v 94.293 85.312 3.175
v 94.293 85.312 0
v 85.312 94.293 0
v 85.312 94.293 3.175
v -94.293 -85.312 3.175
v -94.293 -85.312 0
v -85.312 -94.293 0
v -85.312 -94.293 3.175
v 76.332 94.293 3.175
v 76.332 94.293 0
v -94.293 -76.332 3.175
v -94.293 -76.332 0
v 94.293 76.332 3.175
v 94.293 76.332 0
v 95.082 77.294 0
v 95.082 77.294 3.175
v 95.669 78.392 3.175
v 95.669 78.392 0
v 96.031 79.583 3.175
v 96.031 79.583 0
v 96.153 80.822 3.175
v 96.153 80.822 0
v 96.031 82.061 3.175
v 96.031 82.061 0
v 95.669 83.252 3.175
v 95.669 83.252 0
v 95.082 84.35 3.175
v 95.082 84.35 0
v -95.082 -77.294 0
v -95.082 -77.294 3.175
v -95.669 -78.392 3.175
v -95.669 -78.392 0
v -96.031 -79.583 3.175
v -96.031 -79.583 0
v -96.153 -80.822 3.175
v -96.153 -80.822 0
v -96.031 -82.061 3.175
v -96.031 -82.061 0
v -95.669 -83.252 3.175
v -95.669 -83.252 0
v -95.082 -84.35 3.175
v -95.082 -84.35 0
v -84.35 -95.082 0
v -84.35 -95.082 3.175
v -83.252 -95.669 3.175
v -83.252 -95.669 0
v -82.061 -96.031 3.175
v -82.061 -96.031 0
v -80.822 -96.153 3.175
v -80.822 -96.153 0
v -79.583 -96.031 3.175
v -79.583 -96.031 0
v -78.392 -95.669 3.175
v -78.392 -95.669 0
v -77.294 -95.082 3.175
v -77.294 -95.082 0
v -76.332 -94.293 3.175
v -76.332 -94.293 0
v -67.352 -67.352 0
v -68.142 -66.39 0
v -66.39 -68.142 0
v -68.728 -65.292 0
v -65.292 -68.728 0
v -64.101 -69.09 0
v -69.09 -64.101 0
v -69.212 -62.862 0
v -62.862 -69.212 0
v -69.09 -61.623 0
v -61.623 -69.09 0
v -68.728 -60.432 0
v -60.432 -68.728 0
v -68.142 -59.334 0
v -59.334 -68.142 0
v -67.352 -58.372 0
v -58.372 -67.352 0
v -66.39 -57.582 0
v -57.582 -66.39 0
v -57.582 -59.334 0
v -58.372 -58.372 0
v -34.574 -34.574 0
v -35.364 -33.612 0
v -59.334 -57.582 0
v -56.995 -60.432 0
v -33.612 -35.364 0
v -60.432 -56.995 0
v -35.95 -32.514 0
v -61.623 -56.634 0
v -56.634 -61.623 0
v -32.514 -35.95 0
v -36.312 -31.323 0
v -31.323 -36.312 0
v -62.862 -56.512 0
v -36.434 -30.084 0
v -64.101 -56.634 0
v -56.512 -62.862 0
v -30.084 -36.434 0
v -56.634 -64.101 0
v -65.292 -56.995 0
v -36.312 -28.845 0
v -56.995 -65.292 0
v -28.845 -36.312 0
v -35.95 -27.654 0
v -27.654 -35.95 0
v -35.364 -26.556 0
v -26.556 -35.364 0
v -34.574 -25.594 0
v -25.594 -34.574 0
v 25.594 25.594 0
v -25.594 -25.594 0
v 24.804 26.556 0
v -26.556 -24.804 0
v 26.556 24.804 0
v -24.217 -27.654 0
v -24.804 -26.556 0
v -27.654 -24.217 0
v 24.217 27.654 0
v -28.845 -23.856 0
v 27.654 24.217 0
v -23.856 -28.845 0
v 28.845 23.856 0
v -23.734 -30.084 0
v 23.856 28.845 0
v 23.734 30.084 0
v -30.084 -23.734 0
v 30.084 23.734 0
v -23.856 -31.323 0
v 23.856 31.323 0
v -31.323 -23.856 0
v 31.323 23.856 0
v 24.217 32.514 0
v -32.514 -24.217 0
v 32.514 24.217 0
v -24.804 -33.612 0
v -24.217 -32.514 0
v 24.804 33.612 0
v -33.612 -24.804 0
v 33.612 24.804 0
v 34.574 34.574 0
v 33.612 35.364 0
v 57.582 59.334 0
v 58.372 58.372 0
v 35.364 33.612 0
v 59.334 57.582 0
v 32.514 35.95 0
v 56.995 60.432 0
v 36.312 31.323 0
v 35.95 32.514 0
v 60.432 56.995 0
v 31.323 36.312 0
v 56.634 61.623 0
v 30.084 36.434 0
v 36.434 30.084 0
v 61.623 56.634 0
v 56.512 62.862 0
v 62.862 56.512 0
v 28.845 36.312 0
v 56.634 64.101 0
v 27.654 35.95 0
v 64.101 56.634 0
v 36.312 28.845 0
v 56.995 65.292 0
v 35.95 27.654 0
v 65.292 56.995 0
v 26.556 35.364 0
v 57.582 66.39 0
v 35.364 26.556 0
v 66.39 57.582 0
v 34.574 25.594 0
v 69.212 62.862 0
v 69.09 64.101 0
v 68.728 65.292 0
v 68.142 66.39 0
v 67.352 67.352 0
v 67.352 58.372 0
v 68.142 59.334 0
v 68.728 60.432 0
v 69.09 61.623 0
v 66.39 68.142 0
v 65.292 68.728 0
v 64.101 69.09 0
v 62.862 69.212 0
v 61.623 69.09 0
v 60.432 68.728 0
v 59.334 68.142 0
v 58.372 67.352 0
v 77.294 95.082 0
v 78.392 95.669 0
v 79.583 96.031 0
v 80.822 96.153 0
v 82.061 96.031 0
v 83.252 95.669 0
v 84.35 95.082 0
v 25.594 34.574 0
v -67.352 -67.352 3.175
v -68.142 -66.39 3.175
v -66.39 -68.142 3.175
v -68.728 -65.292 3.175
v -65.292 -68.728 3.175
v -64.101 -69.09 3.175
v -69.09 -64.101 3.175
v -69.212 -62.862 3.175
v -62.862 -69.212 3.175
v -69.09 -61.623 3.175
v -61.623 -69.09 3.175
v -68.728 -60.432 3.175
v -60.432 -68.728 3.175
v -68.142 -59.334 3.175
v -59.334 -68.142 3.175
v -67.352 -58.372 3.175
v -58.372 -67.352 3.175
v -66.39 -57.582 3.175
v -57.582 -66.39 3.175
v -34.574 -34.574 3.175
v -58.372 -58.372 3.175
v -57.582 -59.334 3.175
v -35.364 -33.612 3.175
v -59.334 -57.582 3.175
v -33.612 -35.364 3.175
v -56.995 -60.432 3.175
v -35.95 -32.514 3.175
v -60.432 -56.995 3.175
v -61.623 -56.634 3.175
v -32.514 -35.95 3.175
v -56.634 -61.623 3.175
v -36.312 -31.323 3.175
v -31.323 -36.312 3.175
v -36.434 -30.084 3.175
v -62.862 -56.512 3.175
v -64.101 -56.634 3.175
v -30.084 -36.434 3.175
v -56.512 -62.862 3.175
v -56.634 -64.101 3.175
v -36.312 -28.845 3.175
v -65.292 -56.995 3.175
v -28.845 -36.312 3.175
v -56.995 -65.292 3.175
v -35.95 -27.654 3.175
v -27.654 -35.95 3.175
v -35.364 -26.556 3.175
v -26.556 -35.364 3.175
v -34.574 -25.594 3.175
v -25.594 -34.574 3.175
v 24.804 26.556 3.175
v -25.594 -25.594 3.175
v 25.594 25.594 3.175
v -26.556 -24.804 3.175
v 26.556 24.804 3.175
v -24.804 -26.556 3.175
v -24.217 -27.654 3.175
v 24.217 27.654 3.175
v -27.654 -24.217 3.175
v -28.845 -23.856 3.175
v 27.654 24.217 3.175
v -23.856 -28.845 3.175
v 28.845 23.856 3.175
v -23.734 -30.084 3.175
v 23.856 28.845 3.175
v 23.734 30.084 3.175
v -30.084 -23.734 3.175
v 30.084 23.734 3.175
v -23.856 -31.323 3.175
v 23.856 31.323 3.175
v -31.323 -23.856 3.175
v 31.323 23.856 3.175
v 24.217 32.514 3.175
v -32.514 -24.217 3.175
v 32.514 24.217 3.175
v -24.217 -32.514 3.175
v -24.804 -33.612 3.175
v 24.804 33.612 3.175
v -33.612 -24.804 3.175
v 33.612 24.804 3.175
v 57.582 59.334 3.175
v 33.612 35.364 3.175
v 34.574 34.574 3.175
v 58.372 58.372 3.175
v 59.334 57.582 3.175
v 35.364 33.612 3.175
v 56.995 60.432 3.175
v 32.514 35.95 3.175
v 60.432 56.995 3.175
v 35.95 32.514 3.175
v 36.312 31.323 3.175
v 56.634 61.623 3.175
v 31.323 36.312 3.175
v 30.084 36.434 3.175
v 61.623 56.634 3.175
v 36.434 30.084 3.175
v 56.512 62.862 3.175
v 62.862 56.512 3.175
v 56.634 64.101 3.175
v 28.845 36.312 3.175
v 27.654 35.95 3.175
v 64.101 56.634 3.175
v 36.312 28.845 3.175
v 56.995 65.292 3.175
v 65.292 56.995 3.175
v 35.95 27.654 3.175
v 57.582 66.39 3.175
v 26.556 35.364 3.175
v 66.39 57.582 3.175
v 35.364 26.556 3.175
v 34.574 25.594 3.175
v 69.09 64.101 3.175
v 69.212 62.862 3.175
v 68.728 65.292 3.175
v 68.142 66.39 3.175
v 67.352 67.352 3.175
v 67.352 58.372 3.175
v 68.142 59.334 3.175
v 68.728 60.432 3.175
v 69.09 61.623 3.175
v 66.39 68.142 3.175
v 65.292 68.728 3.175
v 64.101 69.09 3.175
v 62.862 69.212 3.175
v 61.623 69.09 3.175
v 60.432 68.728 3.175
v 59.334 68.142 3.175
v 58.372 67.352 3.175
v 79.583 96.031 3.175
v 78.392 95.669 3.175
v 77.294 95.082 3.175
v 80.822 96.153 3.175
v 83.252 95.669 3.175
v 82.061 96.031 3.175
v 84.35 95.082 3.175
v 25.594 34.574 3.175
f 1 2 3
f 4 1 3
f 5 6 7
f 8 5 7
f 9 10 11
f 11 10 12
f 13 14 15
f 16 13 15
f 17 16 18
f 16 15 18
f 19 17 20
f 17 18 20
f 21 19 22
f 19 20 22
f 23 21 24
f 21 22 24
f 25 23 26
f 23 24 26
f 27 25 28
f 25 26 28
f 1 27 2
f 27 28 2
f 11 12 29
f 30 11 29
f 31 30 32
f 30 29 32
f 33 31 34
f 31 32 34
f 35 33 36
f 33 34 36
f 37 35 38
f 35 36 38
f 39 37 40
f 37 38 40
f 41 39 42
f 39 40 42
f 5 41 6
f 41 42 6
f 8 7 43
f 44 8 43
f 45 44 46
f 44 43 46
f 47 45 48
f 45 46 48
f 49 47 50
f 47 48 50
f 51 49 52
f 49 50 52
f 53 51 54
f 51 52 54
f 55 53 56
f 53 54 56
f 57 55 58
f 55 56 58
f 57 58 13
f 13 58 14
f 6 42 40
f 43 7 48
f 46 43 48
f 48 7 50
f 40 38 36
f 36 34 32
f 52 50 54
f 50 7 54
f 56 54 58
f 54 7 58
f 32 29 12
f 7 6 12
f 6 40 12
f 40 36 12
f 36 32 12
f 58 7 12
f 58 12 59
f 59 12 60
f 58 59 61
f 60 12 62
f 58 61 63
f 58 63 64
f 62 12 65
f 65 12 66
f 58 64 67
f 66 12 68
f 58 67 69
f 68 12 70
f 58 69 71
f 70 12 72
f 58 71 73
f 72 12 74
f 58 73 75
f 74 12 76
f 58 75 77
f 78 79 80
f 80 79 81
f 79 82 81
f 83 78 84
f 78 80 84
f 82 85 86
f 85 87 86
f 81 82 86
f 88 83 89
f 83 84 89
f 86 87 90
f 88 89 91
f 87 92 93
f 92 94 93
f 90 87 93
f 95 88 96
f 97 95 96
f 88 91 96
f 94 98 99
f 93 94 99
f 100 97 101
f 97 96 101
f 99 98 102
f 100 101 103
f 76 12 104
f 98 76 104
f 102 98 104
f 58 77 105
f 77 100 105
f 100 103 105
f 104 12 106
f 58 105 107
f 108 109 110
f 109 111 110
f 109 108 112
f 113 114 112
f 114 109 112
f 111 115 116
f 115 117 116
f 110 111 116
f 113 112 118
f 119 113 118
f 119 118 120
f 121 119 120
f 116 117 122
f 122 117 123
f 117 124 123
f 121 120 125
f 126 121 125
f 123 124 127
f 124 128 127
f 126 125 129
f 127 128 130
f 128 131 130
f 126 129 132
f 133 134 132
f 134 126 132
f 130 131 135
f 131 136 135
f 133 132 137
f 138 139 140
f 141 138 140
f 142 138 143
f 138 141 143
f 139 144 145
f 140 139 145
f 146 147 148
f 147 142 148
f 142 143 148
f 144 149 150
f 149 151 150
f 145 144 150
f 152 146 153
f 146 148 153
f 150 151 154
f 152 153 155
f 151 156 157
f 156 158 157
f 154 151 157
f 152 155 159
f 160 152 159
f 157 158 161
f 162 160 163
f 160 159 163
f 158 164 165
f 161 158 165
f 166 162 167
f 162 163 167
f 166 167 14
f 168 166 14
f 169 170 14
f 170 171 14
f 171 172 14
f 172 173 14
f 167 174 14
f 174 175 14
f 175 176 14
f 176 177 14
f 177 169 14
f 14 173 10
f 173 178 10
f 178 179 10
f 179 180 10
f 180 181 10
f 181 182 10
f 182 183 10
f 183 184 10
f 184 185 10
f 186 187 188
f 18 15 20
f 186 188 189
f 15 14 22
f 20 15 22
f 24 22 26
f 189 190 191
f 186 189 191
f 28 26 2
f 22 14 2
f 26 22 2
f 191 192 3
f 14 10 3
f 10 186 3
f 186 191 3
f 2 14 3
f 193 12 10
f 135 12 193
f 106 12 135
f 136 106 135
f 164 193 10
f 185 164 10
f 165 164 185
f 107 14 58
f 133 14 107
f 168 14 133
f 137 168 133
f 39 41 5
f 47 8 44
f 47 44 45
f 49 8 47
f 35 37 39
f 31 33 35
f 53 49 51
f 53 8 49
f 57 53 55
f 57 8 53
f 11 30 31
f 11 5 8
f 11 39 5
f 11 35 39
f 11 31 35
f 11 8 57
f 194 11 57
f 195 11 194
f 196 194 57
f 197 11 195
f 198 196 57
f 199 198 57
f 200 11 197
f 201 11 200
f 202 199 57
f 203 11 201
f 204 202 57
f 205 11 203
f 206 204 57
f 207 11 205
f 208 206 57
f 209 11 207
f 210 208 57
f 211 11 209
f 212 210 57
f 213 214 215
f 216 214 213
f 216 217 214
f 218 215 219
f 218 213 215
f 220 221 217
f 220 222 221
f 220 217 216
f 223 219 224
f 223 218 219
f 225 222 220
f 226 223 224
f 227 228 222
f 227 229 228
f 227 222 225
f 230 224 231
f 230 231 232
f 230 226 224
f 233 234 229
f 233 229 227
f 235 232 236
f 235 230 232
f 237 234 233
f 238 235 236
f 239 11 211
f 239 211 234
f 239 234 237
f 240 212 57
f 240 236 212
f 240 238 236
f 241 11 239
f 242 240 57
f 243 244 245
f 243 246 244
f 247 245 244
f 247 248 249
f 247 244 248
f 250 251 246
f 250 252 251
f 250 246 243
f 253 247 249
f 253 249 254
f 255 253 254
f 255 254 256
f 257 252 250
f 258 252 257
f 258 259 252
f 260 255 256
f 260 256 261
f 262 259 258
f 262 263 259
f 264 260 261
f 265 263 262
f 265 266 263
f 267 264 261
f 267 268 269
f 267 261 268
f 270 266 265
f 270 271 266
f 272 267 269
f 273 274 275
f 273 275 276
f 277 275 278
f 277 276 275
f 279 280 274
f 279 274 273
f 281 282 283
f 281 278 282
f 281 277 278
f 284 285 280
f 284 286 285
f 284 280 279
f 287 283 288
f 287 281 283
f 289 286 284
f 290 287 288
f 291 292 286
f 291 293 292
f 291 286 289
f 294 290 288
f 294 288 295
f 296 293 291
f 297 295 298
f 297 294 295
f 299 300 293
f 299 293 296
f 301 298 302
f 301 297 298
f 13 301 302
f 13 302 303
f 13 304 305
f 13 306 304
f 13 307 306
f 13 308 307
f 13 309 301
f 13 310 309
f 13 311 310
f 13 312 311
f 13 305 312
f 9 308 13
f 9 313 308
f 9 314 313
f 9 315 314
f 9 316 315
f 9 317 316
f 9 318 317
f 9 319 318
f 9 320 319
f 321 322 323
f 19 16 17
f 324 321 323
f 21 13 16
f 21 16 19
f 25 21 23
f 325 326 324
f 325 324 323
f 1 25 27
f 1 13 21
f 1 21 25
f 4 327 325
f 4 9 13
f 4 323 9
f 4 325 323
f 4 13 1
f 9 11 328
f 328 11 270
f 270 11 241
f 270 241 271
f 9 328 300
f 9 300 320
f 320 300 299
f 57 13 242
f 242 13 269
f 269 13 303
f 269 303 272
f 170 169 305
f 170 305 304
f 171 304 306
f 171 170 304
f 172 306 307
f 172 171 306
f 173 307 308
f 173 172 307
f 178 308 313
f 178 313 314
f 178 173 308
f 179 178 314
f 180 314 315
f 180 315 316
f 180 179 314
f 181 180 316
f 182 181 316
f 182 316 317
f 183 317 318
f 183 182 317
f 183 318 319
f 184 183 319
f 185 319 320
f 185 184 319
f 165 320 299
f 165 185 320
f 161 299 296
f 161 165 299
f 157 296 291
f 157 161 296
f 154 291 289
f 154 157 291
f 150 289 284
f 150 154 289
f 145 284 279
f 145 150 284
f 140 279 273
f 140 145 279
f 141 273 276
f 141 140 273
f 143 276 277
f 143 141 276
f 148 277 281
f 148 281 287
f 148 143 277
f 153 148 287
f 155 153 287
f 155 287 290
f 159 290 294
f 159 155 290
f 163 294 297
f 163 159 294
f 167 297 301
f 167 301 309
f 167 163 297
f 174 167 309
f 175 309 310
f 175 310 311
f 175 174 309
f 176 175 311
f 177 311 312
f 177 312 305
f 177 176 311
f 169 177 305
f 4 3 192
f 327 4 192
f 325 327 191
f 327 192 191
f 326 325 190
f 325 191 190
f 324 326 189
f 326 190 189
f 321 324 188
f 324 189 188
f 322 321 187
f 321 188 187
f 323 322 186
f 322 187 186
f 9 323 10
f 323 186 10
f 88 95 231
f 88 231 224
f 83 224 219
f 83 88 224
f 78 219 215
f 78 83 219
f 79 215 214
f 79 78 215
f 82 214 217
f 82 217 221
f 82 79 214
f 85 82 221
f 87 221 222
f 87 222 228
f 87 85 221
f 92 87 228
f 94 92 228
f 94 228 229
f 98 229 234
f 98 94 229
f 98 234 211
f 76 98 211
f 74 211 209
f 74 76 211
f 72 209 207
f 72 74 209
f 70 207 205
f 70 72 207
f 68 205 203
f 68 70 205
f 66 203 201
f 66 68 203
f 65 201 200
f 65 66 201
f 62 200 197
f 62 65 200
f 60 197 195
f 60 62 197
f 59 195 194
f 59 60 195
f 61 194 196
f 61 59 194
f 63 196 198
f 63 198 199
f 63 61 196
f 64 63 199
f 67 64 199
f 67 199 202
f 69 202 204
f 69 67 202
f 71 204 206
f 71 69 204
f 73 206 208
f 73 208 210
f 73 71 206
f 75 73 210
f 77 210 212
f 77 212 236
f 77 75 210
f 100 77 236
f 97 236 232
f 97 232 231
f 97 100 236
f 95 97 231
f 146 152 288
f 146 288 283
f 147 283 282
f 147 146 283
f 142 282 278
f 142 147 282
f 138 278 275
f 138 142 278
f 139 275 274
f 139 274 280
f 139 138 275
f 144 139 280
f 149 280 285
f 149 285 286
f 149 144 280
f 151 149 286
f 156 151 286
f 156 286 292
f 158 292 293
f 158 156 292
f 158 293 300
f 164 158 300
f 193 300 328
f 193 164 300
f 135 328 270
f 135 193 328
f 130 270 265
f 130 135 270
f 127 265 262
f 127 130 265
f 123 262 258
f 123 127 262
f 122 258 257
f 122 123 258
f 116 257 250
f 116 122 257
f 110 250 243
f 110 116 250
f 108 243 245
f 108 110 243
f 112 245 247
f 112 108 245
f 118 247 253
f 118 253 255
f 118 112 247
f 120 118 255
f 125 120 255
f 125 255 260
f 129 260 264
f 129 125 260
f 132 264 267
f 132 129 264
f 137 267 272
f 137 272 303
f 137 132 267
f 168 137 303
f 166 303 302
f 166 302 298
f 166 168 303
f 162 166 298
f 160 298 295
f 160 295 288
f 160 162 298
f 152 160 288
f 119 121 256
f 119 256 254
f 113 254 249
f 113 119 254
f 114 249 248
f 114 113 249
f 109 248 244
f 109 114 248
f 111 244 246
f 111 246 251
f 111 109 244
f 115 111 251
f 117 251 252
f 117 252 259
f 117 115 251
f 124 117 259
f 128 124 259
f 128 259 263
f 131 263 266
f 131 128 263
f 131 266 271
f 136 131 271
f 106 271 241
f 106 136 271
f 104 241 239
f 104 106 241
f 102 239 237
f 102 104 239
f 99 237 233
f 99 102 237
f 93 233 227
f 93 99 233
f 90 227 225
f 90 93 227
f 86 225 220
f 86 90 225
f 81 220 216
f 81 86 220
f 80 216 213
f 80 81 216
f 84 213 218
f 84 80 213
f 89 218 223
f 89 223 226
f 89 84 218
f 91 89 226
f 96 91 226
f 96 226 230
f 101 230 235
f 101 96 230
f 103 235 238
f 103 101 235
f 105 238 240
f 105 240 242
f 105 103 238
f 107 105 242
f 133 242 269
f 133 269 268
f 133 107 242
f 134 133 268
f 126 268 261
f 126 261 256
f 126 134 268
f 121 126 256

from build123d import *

# Parameters (mm, degrees)
F0_R     = 6.35
F1_DEPTH = 3.175


with BuildPart() as f1:
    # F0 (on Top) → F1 (new body)
    with BuildSketch(Plane.XY):
        with BuildLine():
            Line((76.332177, 94.292689), (-8.980256, 8.980256))
            Line((-8.980256, 8.980256), (-94.292689, -76.332177))
            ThreePointArc((-94.292689, -76.332177), (-96.152561, -80.822305), (-94.292689, -85.312433))
            Line((-94.292689, -85.312433), (-89.802561, -89.802561))
            Line((-89.802561, -89.802561), (-85.312433, -94.292689))
            ThreePointArc((-85.312433, -94.292689), (-80.822305, -96.152561), (-76.332177, -94.292689))
            Line((-76.332177, -94.292689), (8.980256, -8.980256))
            Line((8.980256, -8.980256), (94.292689, 76.332177))
            ThreePointArc((94.292689, 76.332177), (96.152561, 80.822305), (94.292689, 85.312433))
            Line((94.292689, 85.312433), (89.802561, 89.802561))
            Line((89.802561, 89.802561), (85.312433, 94.292689))
            ThreePointArc((85.312433, 94.292689), (80.822305, 96.152561), (76.332177, 94.292689))
        make_face()
        with Locations((-62.861793, -62.861793)):
            Circle(F0_R, mode=Mode.SUBTRACT)
        with Locations((-30.083858, -30.083858)):
            Circle(F0_R, mode=Mode.SUBTRACT)
        with Locations((30.083858, 30.083858)):
            Circle(F0_R, mode=Mode.SUBTRACT)
        with Locations((62.861793, 62.861793)):
            Circle(F0_R, mode=Mode.SUBTRACT)
    extrude(amount=F1_DEPTH)


solid = f1.part
